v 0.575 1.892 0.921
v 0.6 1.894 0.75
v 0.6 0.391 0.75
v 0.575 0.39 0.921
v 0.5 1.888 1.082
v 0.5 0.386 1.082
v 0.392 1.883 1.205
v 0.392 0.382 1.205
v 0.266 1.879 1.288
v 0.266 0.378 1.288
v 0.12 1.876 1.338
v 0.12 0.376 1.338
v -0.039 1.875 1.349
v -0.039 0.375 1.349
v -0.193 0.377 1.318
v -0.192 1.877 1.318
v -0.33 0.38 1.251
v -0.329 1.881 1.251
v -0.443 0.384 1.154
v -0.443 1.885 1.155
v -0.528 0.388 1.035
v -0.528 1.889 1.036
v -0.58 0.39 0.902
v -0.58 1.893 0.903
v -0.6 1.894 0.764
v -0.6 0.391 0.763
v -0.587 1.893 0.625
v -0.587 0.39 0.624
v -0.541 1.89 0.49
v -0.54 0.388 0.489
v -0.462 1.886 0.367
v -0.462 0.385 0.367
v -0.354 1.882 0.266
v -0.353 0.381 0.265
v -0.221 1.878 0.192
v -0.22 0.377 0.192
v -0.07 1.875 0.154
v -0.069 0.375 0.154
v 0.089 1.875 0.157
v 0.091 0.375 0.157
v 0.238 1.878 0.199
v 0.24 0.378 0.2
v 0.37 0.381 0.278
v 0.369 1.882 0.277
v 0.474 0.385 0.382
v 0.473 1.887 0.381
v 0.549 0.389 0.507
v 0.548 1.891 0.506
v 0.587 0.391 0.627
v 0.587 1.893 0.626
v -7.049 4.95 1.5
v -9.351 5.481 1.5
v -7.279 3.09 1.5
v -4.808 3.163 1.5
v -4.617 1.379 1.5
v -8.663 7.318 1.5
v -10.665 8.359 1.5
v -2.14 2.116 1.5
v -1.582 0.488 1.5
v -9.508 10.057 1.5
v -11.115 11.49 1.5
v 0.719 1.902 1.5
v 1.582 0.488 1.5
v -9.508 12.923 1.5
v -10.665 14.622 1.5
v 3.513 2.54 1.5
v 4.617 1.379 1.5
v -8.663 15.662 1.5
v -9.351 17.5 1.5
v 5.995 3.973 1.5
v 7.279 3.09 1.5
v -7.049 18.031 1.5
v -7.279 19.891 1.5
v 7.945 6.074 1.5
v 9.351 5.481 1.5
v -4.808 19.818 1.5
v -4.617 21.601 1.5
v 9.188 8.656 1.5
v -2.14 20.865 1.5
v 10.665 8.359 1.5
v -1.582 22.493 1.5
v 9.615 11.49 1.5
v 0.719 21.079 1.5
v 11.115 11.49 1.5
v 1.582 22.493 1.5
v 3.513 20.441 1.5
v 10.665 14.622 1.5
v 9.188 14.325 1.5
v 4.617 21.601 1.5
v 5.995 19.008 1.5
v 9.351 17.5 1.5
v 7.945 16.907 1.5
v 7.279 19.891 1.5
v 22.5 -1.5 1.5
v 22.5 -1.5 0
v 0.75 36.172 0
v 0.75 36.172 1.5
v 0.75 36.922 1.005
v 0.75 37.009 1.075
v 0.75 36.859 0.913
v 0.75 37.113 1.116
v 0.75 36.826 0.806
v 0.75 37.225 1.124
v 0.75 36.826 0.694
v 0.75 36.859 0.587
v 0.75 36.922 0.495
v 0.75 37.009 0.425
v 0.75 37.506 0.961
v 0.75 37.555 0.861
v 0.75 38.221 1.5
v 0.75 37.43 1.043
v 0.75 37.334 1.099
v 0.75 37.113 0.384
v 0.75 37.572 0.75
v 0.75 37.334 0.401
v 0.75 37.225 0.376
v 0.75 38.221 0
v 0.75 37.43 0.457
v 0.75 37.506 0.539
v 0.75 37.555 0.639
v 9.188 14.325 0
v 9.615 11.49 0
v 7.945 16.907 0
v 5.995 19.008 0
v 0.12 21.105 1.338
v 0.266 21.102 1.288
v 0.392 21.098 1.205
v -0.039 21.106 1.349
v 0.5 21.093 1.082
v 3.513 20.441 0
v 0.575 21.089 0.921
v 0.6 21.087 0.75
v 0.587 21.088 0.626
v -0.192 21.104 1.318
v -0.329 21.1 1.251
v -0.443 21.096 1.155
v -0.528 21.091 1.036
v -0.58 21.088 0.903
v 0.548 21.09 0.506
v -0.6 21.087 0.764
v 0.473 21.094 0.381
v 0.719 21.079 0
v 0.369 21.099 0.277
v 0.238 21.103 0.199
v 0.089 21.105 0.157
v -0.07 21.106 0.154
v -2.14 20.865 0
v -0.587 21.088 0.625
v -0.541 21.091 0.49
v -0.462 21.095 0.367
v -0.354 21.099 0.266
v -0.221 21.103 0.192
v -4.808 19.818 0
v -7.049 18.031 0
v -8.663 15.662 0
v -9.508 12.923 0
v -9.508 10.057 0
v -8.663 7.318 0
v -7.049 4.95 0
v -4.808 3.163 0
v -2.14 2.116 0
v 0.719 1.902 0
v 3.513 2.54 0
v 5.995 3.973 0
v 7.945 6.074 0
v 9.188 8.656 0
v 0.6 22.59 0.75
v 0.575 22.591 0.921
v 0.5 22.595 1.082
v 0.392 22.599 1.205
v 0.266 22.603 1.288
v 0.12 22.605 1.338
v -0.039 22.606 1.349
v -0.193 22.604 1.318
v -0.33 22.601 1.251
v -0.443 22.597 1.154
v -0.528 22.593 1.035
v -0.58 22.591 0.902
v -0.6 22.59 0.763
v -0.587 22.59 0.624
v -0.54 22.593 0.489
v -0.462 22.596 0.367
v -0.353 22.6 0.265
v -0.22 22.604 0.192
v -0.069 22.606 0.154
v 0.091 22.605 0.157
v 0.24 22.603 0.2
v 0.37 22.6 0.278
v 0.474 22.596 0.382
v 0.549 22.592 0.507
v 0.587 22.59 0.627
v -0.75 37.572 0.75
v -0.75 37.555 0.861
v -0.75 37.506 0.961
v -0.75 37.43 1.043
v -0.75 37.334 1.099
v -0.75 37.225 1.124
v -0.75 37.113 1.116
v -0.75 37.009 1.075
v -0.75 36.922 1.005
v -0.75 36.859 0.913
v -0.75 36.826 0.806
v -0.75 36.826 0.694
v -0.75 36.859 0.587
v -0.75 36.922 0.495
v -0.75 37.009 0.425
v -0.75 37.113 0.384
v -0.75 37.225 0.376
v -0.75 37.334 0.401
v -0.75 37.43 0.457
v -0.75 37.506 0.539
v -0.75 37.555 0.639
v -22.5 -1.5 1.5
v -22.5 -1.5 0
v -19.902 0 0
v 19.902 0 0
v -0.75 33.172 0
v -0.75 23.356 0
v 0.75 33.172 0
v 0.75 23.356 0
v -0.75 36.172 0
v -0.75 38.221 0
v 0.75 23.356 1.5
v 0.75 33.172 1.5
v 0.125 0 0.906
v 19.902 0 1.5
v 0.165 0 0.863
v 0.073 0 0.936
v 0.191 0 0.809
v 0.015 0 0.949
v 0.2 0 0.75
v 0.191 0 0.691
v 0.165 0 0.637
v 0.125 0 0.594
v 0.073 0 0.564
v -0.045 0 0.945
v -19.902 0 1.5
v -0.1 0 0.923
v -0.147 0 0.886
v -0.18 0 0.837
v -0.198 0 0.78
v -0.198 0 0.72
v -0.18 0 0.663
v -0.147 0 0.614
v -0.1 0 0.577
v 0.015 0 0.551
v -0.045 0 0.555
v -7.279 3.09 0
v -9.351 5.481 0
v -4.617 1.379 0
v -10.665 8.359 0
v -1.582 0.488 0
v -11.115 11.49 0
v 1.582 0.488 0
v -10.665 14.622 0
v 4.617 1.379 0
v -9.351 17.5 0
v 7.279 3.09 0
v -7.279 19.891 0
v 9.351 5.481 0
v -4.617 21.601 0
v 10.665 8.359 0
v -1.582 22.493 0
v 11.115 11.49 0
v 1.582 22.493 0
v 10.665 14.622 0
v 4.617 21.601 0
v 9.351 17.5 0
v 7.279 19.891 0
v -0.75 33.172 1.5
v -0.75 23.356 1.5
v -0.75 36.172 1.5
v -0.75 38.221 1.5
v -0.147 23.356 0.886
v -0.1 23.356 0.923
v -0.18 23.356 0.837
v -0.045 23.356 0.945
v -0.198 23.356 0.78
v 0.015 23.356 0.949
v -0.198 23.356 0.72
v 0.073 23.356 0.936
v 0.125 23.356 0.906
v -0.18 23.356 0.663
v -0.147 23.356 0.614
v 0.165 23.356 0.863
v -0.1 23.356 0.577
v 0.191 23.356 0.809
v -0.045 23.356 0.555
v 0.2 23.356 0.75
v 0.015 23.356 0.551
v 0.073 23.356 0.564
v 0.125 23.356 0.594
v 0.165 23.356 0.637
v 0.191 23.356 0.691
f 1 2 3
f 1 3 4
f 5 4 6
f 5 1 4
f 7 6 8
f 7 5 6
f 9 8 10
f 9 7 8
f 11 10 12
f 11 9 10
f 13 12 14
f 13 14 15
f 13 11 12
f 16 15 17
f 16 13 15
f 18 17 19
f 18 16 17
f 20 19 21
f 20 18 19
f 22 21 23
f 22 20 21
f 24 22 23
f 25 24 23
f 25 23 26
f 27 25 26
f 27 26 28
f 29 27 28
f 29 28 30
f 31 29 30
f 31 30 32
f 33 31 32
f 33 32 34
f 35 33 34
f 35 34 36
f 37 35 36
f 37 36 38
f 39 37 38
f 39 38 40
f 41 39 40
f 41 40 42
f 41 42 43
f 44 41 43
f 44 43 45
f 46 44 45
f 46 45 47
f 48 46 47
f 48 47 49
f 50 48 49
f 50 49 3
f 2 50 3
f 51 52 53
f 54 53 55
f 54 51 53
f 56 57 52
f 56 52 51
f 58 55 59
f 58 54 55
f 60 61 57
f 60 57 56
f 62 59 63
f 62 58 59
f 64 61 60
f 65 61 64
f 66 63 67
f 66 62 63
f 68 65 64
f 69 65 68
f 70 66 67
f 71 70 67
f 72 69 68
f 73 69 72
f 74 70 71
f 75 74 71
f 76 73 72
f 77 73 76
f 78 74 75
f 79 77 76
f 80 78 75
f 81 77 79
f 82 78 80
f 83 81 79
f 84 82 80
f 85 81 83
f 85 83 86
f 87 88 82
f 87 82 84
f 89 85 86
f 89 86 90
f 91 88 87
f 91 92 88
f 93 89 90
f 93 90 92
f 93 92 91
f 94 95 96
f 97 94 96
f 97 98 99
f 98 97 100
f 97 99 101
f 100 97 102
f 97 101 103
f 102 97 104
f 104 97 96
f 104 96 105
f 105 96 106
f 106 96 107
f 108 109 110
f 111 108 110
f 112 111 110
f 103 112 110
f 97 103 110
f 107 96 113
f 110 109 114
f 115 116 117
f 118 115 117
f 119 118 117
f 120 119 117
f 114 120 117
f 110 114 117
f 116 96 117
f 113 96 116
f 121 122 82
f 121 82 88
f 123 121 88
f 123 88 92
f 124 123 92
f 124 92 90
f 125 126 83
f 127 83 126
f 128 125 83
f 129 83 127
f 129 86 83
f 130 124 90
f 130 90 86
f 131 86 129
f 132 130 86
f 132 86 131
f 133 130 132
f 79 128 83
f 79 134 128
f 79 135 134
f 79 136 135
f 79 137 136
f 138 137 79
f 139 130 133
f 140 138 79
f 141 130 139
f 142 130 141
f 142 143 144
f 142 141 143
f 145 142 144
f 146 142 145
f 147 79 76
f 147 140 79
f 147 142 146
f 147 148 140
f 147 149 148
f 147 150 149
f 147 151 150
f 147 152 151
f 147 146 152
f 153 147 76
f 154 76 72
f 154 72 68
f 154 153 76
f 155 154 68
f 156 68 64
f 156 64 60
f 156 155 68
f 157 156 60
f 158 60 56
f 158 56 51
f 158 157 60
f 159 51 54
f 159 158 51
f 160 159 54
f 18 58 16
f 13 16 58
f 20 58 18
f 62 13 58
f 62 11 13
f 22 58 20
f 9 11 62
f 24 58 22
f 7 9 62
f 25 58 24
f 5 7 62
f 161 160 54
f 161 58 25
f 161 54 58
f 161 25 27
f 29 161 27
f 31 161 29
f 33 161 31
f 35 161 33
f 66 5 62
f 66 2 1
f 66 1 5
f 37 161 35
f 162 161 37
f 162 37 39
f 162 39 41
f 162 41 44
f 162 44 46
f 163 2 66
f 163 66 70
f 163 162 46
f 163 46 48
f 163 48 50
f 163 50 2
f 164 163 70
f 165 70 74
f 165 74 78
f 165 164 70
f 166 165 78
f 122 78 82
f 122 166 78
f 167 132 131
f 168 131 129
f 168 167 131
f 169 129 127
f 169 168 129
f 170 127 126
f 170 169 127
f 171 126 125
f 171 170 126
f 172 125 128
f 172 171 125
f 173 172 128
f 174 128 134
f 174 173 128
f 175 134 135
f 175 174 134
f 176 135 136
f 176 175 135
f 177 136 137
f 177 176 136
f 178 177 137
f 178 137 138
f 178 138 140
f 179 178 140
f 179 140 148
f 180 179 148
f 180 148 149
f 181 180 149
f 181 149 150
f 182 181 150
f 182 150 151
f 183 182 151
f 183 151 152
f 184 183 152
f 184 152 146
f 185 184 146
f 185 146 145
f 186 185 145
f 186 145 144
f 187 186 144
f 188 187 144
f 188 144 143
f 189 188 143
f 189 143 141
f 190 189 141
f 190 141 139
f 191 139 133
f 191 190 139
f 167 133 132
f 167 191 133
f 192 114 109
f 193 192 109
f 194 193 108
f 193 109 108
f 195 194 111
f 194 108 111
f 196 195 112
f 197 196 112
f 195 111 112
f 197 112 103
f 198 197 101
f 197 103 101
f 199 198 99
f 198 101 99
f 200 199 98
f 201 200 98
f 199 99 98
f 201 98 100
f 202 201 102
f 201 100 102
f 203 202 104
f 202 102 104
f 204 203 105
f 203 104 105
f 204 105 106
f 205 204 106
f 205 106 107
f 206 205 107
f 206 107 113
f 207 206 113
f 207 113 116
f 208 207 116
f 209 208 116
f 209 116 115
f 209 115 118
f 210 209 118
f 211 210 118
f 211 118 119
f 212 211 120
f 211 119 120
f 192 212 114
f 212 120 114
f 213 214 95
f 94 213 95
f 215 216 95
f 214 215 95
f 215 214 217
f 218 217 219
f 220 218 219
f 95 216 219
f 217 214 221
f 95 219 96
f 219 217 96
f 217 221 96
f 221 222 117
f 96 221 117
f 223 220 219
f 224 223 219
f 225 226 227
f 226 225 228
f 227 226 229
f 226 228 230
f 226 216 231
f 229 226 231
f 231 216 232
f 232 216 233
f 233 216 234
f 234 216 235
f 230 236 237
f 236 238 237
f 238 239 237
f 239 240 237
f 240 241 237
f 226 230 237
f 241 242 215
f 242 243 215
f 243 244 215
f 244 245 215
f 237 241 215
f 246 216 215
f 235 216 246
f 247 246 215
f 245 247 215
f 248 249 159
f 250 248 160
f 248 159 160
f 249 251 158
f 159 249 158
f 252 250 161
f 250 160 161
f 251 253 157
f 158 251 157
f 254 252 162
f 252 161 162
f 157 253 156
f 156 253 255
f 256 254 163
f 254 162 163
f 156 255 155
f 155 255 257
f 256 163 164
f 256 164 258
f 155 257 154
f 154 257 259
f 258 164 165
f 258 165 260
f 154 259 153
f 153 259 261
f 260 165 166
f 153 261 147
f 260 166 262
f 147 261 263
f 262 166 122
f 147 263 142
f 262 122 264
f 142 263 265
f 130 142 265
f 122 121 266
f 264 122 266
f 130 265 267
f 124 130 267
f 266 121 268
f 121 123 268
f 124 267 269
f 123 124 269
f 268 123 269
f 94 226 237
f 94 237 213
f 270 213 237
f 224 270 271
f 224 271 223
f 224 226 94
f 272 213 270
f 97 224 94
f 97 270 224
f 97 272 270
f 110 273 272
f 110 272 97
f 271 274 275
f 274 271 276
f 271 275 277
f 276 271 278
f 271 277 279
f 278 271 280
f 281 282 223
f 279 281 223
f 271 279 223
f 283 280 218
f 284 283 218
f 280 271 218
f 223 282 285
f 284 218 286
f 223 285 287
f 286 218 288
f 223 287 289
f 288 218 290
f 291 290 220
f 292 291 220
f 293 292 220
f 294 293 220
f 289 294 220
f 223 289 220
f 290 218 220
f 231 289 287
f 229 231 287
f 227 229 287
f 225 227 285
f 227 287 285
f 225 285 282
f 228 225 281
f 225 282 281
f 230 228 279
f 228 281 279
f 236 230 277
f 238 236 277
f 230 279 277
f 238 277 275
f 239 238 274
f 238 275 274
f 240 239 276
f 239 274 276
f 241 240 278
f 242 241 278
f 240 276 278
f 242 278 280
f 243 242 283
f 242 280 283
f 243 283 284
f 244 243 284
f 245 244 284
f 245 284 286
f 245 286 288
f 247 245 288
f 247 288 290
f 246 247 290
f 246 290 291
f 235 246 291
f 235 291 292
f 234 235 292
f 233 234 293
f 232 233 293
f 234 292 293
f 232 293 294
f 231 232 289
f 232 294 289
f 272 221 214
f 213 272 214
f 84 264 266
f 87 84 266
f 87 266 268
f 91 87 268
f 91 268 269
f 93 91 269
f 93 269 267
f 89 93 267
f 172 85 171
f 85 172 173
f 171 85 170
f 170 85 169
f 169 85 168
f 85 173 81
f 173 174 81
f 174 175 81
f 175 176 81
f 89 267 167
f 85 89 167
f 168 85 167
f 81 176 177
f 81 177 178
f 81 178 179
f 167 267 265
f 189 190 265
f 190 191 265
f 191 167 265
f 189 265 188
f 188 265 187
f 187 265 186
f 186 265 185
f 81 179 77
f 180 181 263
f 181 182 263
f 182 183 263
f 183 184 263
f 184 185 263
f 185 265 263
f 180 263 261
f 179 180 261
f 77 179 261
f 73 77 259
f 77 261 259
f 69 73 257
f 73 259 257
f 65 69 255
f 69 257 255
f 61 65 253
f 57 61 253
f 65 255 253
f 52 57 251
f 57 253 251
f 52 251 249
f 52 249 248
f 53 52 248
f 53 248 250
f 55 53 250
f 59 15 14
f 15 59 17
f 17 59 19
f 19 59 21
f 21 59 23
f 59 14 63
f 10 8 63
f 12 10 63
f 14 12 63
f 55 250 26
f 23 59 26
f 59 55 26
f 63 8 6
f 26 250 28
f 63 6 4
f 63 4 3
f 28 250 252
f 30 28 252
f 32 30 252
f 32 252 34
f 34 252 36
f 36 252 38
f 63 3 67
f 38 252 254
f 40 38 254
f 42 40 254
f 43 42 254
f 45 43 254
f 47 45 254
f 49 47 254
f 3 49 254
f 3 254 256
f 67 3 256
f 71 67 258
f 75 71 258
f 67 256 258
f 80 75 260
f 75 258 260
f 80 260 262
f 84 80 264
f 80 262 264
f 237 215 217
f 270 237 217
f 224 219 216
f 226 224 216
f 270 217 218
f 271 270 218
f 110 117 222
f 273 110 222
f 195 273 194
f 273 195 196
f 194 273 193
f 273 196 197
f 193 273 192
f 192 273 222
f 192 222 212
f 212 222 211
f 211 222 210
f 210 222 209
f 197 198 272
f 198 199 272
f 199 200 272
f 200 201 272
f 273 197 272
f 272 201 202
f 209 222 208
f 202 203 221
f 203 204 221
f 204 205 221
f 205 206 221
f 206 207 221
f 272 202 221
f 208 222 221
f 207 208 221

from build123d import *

# Parameters (mm, degrees)
F2_DEPTH = 1.5
F1_R     = 11.1153810568
F1_R_2   = 9.6153810568
F3_R     = 0.6
F3_R_2   = 0.2
F4_DEPTH = 23.3557621135
F5_DEPTH = 23.3557621135
F6_R     = 0.375
F7_DEPTH = 1.5


with BuildPart() as f2:
    # F1 (on Top) → F2 (new body)
    with BuildSketch(Plane.XY):
        Polygon((-0.75, 33.1721050646), (0, 34.4711431703), (0.75, 33.1721050646), (0.75, 36.1721050646), (0, 37.4711431703), (-0.75, 36.1721050646), align=None)
        Polygon((-19.9019237886, 0), (-0.75, 33.1721050646), (-0.75, 36.1721050646), (-22.5, -1.5), (22.5, -1.5), (0.75, 36.1721050646), (0.75, 33.1721050646), (19.9019237886, 0), align=None)
        Polygon((-0.75, 38.2211431703), (-0.75, 36.1721050646), (0, 37.4711431703), (0.75, 36.1721050646), (0.75, 38.2211431703), align=None)
        Polygon((0.75, 33.1721050646), (0, 34.4711431703), (-0.75, 33.1721050646), (-0.75, 23.3557621135), (0.75, 23.3557621135), align=None)
    extrude(amount=F2_DEPTH)

    # F3 (on face) → F5 (join, through all)
    with BuildSketch(Plane.XZ.offset(-23.3557621135)):
        with Locations((0, 0.75)):
            Circle(F3_R_2)
    extrude(amount=F5_DEPTH)

    # F6 (on face) → F7 (cut, through all)
    with BuildSketch(Plane.YZ.offset(0.75)):
        with Locations((37.1966241175, 0.75)):
            Circle(F6_R)
    extrude(amount=-F7_DEPTH, mode=Mode.SUBTRACT)


with BuildPart() as f2b:
    # F1 (on Top) → F2, piece 2 (new body)
    with BuildSketch(Plane.XY):
        with Locations((0, 11.4903810568)):
            Circle(F1_R)
        with Locations((0, 11.4903810568)):
            Circle(F1_R_2, mode=Mode.SUBTRACT)
    extrude(amount=F2_DEPTH)

    # F3 (on face) → F4 (cut, through all)
    with BuildSketch(Plane.XZ.offset(-23.3557621135)):
        with Locations((0, 0.75)):
            Circle(F3_R)
        with Locations((0, 0.75)):
            Circle(F3_R_2, mode=Mode.SUBTRACT)
        with Locations((0, 0.75)):
            Circle(F3_R_2)
    extrude(amount=F4_DEPTH, mode=Mode.SUBTRACT)


solid = Compound([f2.part, f2b.part])
